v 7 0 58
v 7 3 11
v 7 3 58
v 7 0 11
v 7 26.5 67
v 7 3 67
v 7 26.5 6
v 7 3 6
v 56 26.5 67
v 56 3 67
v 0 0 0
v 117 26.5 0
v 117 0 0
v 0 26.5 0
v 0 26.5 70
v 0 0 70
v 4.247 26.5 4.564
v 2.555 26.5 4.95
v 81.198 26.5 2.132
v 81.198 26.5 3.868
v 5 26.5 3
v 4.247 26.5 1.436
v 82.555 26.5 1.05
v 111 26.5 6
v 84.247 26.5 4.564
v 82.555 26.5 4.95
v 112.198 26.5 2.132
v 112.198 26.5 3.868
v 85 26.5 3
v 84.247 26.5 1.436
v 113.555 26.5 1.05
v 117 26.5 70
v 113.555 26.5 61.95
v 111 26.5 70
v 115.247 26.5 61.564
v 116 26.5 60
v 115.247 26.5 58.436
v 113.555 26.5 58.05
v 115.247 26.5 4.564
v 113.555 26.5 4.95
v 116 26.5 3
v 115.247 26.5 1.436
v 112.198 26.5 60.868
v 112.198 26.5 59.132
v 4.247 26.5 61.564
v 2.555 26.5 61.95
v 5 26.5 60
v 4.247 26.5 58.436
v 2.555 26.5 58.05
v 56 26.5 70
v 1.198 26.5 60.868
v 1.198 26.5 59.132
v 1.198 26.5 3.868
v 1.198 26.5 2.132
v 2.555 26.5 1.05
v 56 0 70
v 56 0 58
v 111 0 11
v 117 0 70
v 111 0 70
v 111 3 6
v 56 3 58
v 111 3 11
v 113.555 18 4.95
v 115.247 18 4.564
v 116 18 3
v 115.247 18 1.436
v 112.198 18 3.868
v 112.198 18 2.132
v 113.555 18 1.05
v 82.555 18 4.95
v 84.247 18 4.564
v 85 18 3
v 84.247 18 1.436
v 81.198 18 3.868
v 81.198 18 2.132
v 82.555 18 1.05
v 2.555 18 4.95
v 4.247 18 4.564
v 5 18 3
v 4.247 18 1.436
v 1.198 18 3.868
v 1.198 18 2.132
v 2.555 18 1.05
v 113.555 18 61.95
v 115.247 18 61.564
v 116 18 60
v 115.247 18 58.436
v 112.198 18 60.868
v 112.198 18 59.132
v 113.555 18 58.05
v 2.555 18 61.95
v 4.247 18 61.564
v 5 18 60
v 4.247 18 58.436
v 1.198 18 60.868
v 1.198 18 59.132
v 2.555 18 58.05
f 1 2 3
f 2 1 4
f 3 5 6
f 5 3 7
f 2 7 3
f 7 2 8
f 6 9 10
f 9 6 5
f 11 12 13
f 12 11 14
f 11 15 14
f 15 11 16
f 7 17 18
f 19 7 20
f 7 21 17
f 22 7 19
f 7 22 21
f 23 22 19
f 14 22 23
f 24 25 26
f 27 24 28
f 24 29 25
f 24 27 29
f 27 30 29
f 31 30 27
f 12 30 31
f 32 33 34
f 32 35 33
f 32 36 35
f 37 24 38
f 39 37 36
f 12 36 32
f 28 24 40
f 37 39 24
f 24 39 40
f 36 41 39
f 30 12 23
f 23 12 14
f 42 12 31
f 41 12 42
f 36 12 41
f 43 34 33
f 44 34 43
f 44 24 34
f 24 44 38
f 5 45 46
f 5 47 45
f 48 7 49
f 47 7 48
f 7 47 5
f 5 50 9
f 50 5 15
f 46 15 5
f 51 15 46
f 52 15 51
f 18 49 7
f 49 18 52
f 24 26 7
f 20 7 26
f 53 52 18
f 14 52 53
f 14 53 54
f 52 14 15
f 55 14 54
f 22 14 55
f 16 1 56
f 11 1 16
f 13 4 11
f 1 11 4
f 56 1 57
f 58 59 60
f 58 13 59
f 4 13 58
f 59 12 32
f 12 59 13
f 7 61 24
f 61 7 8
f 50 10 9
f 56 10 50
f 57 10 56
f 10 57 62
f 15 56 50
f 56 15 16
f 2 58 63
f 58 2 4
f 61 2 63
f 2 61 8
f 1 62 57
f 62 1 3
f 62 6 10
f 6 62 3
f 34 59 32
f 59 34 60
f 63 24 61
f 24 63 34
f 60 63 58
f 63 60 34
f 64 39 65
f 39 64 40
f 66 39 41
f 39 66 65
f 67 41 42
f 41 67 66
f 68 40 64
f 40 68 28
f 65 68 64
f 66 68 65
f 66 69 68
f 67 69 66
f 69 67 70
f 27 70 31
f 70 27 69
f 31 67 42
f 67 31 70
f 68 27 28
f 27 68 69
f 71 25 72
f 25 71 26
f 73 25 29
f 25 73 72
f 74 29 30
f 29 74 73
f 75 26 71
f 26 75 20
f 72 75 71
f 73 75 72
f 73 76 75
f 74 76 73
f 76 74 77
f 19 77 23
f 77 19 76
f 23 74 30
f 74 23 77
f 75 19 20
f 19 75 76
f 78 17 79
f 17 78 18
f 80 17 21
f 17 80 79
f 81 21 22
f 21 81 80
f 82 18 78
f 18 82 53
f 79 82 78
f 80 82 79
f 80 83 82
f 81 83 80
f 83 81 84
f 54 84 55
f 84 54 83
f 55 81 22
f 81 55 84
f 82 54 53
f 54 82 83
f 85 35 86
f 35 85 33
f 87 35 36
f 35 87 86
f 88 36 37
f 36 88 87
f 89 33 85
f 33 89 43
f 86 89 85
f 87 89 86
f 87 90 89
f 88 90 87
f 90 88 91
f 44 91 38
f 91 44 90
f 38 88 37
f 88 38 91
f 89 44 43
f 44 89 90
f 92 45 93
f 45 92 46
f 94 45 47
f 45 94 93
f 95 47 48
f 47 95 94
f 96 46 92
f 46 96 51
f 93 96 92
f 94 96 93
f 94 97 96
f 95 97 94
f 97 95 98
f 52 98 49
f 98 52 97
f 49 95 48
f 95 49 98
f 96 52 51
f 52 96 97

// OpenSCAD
// file: settingsLenghts.scad
//Ancho de la pared
pared  = 2;
//Radio del centro hueco
radioC = 11;
//Alto de la capa de apertura
aperH = 5.5;
//Ancho de la apertura
aperW = 5+1.1;//Ancho mas holgura
//Ancho del lente macro
macroW = 9.3;
//Profundidad del macro
macroH = 3;
//Profundidad parte de atras y delante
profDelante = 6;
profAtras = 6;
//Ceja entre uniones de cilindros
cejaH = 6;
guiaParedW = 2;
tmpHolg = 1.8;


//Correcc

//
//CÁMARA
camP = 3;//Grueso de la pared del presente modelo
camW = 105;//Ancho de la cámara
camH = 61;//Alto de la cámara
camD = 23.5;//Profundidad de la cámara
camHlg = 6;//Holgura que se deja para los tornillos
camLW = 57/2;//Radio del exterior del lente
torW  = 2;//Radio

//
//Ancho de tubo principal (grande)
mcW = 32;//radio
mcH = 28;

//Dimensiones del difractador
diffW = 51;//Alto y Ancho
diffD=1;//Profundidad del difractador
diffWinW=36;//Ancho de la ventana de difracción
diffWinH=24;//Alto de la ventana de difracción

//
//Adquisición de luz
luzHBig = 10; //donde va el tornillo
luzWBig = 28; //27:diametro donde va el tornillo
luzHBigT = 4; //alto del tornillo
luzWBigT = 6; //6: ancho del tornillo
luzHRosca = 7; //donde va la rosca
luzWRosca = 23; //22:diametro de donde va la rosca



//Cuadro guia para que no se mueva
guiaH = cejaH;
guiaW = 3;



module creaPared(h){
	difference(){
		//Pone el cilindro principal
		cylinder(r=mcW,h);

		//Le quita el contorno exterior
		translate([0,0,-0.1])
		cylinder(r=mcW-pared,h+0.2);
	}
}
module creaGuiaTornilloCentrada(){
	translate([-luzWBigT/2,-luzWBigT/2,0])
	cube([luzWBigT,luzWBigT,luzHBig-1+0.2]);
}
module creaGuiaTornilloCentradaArea(){
	tmpW = luzWBigT + pared;
	tmpH = luzHBig  + pared;
	translate([-tmpW/2,-tmpW/2,0])
	cube([tmpW,tmpW,tmpH]);
}
module creaGuia(h){
	//Pone el circulo soporte
	difference(){
		cylinder(r=mcW,h);
		translate([0,0,-0.1])
		cylinder(r=mcW-pared,h+0.2);
	}
	//Pone la guia1
	translate([0,mcW-pared-(guiaW/2)+0.4,0])
	creaGuiaCentrada(h);
}
module creaGuiaHembra(h){
	//Pone el circulo soporte
	tmpW = mcW-guiaW;	
	creaPared(sopH);
	sopH = 1.35;
	
	//Pone la pared de la guia
	difference(){
		cylinder(r=(mcW-pared),sopH+h);
		translate([0,0,-0.1])
		cylinder(r=(mcW-pared-guiaParedW),sopH+h+0.2);
		//Pone la guia
		translate([-(guiaW/3),tmpW,sopH])
		creaGuiaCentrada(sopH+h+0.2);
		translate([(guiaW/3),tmpW,sopH])
		creaGuiaCentrada(sopH+h+0.2);
	}
}
module creaGuiaCentrada(h){
	translate([-guiaW/2,-guiaW/2,0])
	cube([guiaW,guiaW,h]);
}
// main file
include <settingsLenghts.scad>


//torW = 2;//Radio
torH = 12-camP;

pestDispW = 7;

//camD = 21.66;//Si se quiere ajustar

difference(){
	creaCamaraAtras();
	translate([0,2,0])
	creaTornillos();
}




///////////////////
if(true){
	translate([58.5,26.5,30.5])
	rotate([-90,180,0])
	%creaCamFrente();
}

if(false){
	translate([camHlg,camP,camHlg])
	%cube([camW,camD,camH]);
}



module creaTornillos(){

//Tornillo inf. der.
translate([114,25,3])
creaTornillo();

//Tornillo inf. cen.
translate([83,25,3])
creaTornillo();

//Tornillo inf. izq.
translate([3,25,3])
creaTornillo();

//Tornillo sup. der.
translate([114,25,60])
creaTornillo();

//Tornillo sup. izq.
translate([3,25,60])
creaTornillo();
}


module creaTornillo(){
	rotate([90,0,0])
	cylinder(r=torW,torH);
}


module creaCamaraAtras(){

//Pone costado izquierdo
cube([camP+camHlg-2,camD+camP,camH+camHlg]);

//Pone pestaña izquierda
cube([pestDispW,camP,camH+camHlg]);

//Pone la base
cube([camW+camHlg*2,camD+camP,camHlg]);

//Pone la tapa
tapaW = 56;
translate([0,0,camH+camHlg])
cube([tapaW,camD+camP,camP]);

//Pone pestaña inferior
pestInf = 8;
cube([camW+camHlg*2,camP,camP+pestInf]);

//Pone pestaña superior
pestSup = 8;
translate([0,0,camH-camP])
cube([tapaW,camP,camP+pestSup]);

//Pone costado derecho
translate([camW+camHlg*2-camHlg,0,0])
cube([camHlg,camD+camP,camH+camHlg+camP]);

}








module creaCamFrente(){


camXLen = camW+camHlg*2;//Dist. nec. para poner lente en orilla der.
lenLen2R = 15;//Distancia entre el lado derecho y orilla del lente
lenXPos = (camXLen/2)-camLW-camHlg-lenLen2R;//Pos centro final lente

difference(){
	
	//translate([-(camW/2),-(camH/2)+camHlg,0])
	//cube([camW,camH,camP]);

	//Pone la base de la cámara	
	translate([-camXLen/2,-camH/2,0])
	cube([camW+(camHlg*2),camH+camHlg+3,camP]);
	
	//Quita el área donde entra la cámara
	translate([lenXPos,camHlg,-0.1])
	cylinder(r=camLW+0.5,camP+0.2);

	//Tornillo sup. der.
	translate([(camW/2)+(camHlg/2),(camH/2),-0.1])
	cylinder(r=torW,camP+0.2);

	//Tornillo inf. der.
	translate([(camW/2)+(camHlg/2),-((camH/2)-(camHlg/2)),-0.1])
	cylinder(r=torW,camP+0.2);

	//Tornillo sup. izq.
	translate([-(camW/2)-(camHlg/2),(camH/2),-0.1])
	cylinder(r=torW,camP+0.2);

	//Tornillo inf. izq.
	translate([-(camW/2)-(camHlg/2),-(camH/2)+(camHlg/2),-0.1])
	cylinder(r=torW,camP+0.2);

	//Tornillo sup. cent.
	//translate([-25,(camH/2),-0.1])
	//cylinder(r=torW,camP+0.2);

	//Tornillo inf. cent.
	translate([-25,-(camH/2)+(camHlg/2),-0.1])
	cylinder(r=torW,camP+0.2);
	
}

//Pone la guia hembra
translate([lenXPos,camHlg,camP-1.35])
creaGuiaHembra(cejaH);
}
